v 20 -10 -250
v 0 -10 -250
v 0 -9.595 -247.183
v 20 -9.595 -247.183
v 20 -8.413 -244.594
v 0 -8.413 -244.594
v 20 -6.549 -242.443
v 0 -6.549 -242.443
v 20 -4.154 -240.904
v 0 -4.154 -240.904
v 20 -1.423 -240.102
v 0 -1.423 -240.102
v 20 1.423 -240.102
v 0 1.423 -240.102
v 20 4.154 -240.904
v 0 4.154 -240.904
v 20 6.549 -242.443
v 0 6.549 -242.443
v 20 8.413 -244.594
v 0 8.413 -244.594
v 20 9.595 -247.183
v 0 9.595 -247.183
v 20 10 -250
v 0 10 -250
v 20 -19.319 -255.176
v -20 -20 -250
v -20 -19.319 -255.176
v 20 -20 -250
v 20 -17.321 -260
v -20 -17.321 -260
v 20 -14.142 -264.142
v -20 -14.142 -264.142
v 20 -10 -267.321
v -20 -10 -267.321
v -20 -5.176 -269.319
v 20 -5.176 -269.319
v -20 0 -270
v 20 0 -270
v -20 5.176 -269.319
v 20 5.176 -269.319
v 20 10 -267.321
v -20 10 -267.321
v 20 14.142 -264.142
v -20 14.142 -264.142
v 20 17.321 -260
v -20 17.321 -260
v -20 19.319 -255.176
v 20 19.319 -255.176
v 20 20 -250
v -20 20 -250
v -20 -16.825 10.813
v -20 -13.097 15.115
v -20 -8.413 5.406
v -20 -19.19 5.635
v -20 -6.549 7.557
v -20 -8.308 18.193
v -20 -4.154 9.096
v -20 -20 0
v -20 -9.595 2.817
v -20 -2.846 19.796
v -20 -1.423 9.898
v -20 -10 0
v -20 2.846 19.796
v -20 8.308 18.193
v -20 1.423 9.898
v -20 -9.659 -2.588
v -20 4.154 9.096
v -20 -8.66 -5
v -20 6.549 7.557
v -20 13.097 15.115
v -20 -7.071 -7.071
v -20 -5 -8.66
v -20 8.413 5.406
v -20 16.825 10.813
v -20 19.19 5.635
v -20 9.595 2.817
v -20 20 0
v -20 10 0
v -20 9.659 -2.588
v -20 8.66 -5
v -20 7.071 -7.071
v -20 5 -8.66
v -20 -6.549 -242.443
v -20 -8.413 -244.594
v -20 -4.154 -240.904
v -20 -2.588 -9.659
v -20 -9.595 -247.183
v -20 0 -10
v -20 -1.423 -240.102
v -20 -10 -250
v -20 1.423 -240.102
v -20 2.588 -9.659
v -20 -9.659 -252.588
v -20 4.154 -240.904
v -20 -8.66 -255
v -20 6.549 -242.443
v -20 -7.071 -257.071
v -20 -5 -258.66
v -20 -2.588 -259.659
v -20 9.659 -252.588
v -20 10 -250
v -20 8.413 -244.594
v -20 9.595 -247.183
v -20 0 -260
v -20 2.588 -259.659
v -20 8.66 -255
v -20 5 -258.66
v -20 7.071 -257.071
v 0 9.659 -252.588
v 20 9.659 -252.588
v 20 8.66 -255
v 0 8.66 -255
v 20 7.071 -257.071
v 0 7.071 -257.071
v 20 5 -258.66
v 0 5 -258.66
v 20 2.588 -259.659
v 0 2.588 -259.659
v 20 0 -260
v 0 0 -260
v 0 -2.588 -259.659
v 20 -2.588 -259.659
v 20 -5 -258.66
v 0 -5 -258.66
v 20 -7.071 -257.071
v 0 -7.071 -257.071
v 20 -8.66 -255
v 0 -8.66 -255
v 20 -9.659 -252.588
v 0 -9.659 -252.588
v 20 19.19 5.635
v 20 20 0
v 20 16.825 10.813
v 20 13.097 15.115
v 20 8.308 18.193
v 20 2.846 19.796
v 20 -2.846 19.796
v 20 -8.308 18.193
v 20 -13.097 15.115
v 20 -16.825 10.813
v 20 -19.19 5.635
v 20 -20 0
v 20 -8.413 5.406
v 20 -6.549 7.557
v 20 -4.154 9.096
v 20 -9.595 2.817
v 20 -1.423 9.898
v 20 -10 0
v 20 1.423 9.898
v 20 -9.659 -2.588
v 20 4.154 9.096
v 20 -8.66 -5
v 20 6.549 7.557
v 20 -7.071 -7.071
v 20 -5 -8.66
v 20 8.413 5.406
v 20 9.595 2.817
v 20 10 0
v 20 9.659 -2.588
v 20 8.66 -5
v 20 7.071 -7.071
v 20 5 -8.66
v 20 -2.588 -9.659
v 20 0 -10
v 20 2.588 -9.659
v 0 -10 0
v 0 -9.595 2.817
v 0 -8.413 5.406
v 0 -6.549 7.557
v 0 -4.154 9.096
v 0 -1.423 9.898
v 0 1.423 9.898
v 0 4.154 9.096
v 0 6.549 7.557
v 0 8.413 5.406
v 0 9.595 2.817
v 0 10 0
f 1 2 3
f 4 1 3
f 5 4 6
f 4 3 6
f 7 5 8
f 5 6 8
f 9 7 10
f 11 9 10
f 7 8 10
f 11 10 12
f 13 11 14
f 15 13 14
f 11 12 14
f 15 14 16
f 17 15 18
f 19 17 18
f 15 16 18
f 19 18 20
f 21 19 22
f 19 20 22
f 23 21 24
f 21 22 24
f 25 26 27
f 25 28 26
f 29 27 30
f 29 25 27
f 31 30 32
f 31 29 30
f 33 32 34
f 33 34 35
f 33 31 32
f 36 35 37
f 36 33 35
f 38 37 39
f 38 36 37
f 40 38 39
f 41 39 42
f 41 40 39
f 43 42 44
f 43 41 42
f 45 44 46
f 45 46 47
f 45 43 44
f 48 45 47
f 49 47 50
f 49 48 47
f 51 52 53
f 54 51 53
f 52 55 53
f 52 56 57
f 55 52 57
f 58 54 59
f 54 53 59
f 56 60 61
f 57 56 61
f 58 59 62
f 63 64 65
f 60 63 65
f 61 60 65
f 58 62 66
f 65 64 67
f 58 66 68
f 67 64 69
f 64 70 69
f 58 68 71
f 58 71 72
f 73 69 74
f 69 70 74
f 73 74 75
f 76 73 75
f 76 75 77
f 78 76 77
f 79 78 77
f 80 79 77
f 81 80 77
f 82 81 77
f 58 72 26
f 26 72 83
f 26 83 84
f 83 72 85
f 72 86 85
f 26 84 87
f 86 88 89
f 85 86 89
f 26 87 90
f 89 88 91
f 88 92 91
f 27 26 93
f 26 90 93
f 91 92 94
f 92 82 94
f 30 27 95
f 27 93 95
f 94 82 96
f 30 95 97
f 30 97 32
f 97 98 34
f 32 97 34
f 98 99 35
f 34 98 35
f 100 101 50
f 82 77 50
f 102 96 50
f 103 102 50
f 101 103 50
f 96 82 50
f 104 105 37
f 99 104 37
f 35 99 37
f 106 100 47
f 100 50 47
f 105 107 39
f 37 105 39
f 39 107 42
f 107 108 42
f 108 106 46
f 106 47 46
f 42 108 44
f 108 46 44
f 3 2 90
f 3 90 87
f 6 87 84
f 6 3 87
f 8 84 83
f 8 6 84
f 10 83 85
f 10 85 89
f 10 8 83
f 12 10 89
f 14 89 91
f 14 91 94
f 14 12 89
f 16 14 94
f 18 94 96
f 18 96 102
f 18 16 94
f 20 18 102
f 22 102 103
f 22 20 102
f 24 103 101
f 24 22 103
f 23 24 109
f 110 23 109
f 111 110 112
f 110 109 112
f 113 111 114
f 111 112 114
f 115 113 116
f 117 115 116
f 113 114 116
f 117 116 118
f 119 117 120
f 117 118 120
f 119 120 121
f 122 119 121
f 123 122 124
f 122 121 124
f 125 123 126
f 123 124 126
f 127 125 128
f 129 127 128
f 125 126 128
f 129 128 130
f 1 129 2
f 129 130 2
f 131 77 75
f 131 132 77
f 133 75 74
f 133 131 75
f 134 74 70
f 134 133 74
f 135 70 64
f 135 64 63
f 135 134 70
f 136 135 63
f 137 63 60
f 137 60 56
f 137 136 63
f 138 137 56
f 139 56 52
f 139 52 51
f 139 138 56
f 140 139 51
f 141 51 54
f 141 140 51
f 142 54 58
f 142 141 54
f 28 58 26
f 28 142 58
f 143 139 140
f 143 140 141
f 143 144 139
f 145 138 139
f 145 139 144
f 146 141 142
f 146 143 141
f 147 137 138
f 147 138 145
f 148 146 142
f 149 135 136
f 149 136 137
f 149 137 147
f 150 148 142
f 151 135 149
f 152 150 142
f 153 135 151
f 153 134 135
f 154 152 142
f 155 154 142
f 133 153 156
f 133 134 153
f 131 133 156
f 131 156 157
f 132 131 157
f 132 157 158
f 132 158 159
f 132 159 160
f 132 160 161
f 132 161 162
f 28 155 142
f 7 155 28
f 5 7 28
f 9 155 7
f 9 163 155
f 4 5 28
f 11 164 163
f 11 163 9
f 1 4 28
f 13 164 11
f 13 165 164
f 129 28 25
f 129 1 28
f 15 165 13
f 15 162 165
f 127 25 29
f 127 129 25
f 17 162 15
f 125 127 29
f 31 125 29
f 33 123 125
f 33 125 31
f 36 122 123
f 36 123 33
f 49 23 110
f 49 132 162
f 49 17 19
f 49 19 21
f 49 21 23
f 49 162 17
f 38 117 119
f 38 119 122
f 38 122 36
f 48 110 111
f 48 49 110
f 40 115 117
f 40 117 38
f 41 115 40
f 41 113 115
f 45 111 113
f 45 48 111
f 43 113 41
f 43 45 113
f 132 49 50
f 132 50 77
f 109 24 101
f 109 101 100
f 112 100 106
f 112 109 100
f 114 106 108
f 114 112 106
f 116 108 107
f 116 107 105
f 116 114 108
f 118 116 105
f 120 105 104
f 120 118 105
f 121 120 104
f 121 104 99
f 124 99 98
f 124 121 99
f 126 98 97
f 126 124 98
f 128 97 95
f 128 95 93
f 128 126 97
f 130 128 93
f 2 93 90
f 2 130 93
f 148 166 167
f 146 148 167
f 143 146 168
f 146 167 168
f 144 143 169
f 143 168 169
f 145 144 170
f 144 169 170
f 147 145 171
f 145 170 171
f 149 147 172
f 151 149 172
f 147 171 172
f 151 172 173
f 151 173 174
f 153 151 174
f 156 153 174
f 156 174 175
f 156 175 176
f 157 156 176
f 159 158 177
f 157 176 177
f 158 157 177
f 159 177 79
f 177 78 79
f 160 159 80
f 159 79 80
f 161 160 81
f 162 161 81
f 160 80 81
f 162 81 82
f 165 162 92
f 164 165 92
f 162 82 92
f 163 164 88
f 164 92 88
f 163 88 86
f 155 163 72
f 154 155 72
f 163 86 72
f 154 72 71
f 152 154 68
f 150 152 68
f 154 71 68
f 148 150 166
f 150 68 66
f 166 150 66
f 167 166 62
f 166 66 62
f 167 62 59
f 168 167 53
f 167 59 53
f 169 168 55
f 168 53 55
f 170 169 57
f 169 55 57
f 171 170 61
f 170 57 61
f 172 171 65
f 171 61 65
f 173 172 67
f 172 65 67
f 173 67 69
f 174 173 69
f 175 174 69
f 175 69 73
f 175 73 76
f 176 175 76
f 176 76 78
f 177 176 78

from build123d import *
from build123d.topology import SkipClean

# Parameters (mm, degrees)
BOSS_EXTRUDE1_DEPTH = 20


with BuildPart() as part:
    # Sketch1 → Boss-Extrude1 (new, symmetric)
    with SkipClean():  # the faces are left unmerged after this step: merging them gives an invalid solid
        with BuildSketch(Plane(origin=(0, 0, 0), x_dir=(0, 0, -1), z_dir=(1, 0, 0))):
            with BuildLine():
                ThreePointArc((0, 20), (-20, 0), (0, -20))
                Line((0, -20), (0, -10))
                ThreePointArc((0, -10), (-10, 0), (0, 10))
                Line((0, 10), (0, 20))
            make_face()
            with BuildLine():
                Line((0, -10), (0, -20))
                ThreePointArc((0, -20), (14.142135624, -14.142135624), (20, 0))
                ThreePointArc((20, 0), (14.142135624, 14.142135624), (0, 20))
                Line((0, 20), (0, 10))
                ThreePointArc((0, 10), (7.071067812, 7.071067812), (10, 0))
                ThreePointArc((10, 0), (7.071067812, -7.071067812), (0, -10))
            make_face()
            with BuildLine():
                ThreePointArc((20, 0), (14.142135624, -14.142135624), (0, -20))
                Line((0, -20), (250, -20))
                ThreePointArc((250, -20), (230, 0), (250, 20))
                Line((250, 20), (0, 20))
                ThreePointArc((0, 20), (14.142135624, 14.142135624), (20, 0))
            make_face()
            with BuildLine():
                ThreePointArc((250, 20), (230, 0), (250, -20))
                Line((250, -20), (250, -10))
                ThreePointArc((250, -10), (240, 0), (250, 10))
                Line((250, 10), (250, 20))
            make_face()
            with BuildLine():
                Line((250, -10), (250, -20))
                ThreePointArc((250, -20), (264.142135624, -14.142135624), (270, 0))
                ThreePointArc((270, 0), (264.142135624, 14.142135624), (250, 20))
                Line((250, 20), (250, 10))
                ThreePointArc((250, 10), (257.071067812, 7.071067812), (260, 0))
                ThreePointArc((260, 0), (257.071067812, -7.071067812), (250, -10))
            make_face()
        extrude(amount=BOSS_EXTRUDE1_DEPTH, both=True)


solid = part.part
